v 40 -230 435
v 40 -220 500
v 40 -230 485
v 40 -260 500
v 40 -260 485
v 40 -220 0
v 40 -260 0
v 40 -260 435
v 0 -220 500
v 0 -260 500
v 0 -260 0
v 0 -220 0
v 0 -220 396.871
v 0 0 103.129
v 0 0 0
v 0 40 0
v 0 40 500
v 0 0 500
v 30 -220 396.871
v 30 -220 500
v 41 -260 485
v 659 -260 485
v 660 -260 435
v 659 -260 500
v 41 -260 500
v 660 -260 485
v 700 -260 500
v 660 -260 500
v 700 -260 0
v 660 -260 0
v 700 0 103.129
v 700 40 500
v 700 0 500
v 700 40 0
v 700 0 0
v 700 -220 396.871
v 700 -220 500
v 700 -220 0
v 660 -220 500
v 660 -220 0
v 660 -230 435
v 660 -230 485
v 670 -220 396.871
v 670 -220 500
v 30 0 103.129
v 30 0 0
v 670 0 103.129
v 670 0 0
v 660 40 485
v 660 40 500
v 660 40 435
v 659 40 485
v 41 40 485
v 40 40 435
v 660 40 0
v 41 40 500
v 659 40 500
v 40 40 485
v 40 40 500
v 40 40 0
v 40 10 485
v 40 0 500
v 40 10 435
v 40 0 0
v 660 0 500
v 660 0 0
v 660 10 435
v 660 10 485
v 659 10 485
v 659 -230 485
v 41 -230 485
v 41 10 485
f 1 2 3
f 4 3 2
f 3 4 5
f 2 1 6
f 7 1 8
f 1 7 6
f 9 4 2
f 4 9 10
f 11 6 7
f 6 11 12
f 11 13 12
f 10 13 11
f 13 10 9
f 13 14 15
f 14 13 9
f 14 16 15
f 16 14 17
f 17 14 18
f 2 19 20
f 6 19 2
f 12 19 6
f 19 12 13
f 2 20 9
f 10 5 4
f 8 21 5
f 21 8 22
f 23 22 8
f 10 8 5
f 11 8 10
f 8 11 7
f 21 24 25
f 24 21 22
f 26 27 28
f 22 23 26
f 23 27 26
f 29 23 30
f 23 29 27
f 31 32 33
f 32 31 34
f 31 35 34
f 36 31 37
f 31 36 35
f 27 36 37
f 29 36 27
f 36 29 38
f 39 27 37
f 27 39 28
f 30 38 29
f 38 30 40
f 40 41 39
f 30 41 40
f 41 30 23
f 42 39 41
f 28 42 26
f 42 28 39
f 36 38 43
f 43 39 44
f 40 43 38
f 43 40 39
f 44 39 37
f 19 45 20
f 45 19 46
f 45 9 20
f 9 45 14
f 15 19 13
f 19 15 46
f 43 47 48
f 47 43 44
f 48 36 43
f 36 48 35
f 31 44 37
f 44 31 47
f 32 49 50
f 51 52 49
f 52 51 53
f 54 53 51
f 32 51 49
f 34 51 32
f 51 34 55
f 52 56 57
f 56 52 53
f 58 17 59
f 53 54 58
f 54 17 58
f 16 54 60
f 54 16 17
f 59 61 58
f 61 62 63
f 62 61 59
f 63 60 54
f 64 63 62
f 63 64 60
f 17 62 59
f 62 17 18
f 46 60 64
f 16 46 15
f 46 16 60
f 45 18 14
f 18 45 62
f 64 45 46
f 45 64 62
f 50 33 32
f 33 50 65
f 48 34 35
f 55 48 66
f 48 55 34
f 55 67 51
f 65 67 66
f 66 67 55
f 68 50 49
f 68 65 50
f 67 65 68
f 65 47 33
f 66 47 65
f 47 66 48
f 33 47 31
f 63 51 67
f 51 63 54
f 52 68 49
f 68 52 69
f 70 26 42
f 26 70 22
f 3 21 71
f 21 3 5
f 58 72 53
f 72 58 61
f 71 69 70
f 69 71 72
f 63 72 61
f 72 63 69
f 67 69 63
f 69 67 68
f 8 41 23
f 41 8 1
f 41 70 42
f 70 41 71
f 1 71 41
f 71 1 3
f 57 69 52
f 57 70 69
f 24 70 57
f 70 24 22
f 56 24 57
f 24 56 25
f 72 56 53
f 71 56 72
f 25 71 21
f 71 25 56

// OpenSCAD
module metalon( perf, l, angle1 = 0, angle2 = 0 ) {
    
    cube( [ perf[ 0 ], perf[ 1 ], l ] );
    
}

l = 700;
w = 500;
h = 300;

h_lat = 40;
w_lat = 40;

h_diag = 50;
w_diag = 30;

h_travessa = 30;
w_travessa = 50;

w_tampo = 15;

L = sqrt( w * w + pow( h - 2 * h_lat, 2 ) );
L_tilde = sqrt( L * L - h_diag * h_diag );
angle_diag = atan( w / ( h - 2 * h_lat ) ) - atan( h_diag / L_tilde );
//angle_diag = atan( h / w );

color( [ 0.3, 0.3, 0.3 ] ) rotate( 0, [ 1, 0, 0 ] ) { 
    
    metalon( [ w_lat, h_lat ], w );
    translate( [ l - w_lat, 0, 0 ] )
        metalon( [ w_lat, h_lat ], w );
    
    translate( [ 0, h_lat - h, 0 ] ){
        metalon( [ w_lat, h_lat ], w );
        translate( [ l - w_lat, 0, 0 ] )
            metalon( [ w_lat, h_lat ], w );
    }
    
    difference(){
        union(){
            rotate( 90 - angle_diag, [ 1, 0, 0 ] )
                metalon( [ w_diag, h_diag ], L_tilde );
            translate( [ l - w_diag, 0, 0 ] )
                rotate( 90 - angle_diag, [ 1, 0, 0 ] )
                    metalon( [ w_diag, h_diag ], L_tilde );
        }
        
        translate( [ -1, h_lat, -1 ] )
            cube( [ 1e5, 1e5, 1e5 ] );
        translate( [ -1, -100 - h + h_lat, -1 ] )
            cube( [ 1e5, 100, 1e5 ] );
    }
    
    translate( [ w_lat, h_lat - h_travessa, w - w_tampo ] )
        rotate( 90, [ 0, 1, 0 ] )
            metalon( [ w_travessa, h_travessa ], l - 2 * w_lat );
    translate( [ w_lat, -h + h_lat, w - w_tampo ] )
        rotate( 90, [ 0, 1, 0 ] )
            metalon( [ w_travessa, h_travessa ], l - 2 * w_lat );
//    translate( [ 0, h_lat, w - w_tampo - w_travessa ] )
//        rotate( 90, [ 1, 0, 0 ] )
//            metalon( [ w_travessa, h_travessa ], h - 2 * w_travessa );
}

translate( [ w_lat + 1, -h + h_lat, w - w_tampo ] )
    color( [ 1, 1, 1 ] )
        cube( [ l - 2 * w_lat - 2, h, w_tampo ] );

echo( "Comprimento metalon diagonal: ", L_tilde );
echo( "Ângulo metalon diagonal: ", angle_diag );
